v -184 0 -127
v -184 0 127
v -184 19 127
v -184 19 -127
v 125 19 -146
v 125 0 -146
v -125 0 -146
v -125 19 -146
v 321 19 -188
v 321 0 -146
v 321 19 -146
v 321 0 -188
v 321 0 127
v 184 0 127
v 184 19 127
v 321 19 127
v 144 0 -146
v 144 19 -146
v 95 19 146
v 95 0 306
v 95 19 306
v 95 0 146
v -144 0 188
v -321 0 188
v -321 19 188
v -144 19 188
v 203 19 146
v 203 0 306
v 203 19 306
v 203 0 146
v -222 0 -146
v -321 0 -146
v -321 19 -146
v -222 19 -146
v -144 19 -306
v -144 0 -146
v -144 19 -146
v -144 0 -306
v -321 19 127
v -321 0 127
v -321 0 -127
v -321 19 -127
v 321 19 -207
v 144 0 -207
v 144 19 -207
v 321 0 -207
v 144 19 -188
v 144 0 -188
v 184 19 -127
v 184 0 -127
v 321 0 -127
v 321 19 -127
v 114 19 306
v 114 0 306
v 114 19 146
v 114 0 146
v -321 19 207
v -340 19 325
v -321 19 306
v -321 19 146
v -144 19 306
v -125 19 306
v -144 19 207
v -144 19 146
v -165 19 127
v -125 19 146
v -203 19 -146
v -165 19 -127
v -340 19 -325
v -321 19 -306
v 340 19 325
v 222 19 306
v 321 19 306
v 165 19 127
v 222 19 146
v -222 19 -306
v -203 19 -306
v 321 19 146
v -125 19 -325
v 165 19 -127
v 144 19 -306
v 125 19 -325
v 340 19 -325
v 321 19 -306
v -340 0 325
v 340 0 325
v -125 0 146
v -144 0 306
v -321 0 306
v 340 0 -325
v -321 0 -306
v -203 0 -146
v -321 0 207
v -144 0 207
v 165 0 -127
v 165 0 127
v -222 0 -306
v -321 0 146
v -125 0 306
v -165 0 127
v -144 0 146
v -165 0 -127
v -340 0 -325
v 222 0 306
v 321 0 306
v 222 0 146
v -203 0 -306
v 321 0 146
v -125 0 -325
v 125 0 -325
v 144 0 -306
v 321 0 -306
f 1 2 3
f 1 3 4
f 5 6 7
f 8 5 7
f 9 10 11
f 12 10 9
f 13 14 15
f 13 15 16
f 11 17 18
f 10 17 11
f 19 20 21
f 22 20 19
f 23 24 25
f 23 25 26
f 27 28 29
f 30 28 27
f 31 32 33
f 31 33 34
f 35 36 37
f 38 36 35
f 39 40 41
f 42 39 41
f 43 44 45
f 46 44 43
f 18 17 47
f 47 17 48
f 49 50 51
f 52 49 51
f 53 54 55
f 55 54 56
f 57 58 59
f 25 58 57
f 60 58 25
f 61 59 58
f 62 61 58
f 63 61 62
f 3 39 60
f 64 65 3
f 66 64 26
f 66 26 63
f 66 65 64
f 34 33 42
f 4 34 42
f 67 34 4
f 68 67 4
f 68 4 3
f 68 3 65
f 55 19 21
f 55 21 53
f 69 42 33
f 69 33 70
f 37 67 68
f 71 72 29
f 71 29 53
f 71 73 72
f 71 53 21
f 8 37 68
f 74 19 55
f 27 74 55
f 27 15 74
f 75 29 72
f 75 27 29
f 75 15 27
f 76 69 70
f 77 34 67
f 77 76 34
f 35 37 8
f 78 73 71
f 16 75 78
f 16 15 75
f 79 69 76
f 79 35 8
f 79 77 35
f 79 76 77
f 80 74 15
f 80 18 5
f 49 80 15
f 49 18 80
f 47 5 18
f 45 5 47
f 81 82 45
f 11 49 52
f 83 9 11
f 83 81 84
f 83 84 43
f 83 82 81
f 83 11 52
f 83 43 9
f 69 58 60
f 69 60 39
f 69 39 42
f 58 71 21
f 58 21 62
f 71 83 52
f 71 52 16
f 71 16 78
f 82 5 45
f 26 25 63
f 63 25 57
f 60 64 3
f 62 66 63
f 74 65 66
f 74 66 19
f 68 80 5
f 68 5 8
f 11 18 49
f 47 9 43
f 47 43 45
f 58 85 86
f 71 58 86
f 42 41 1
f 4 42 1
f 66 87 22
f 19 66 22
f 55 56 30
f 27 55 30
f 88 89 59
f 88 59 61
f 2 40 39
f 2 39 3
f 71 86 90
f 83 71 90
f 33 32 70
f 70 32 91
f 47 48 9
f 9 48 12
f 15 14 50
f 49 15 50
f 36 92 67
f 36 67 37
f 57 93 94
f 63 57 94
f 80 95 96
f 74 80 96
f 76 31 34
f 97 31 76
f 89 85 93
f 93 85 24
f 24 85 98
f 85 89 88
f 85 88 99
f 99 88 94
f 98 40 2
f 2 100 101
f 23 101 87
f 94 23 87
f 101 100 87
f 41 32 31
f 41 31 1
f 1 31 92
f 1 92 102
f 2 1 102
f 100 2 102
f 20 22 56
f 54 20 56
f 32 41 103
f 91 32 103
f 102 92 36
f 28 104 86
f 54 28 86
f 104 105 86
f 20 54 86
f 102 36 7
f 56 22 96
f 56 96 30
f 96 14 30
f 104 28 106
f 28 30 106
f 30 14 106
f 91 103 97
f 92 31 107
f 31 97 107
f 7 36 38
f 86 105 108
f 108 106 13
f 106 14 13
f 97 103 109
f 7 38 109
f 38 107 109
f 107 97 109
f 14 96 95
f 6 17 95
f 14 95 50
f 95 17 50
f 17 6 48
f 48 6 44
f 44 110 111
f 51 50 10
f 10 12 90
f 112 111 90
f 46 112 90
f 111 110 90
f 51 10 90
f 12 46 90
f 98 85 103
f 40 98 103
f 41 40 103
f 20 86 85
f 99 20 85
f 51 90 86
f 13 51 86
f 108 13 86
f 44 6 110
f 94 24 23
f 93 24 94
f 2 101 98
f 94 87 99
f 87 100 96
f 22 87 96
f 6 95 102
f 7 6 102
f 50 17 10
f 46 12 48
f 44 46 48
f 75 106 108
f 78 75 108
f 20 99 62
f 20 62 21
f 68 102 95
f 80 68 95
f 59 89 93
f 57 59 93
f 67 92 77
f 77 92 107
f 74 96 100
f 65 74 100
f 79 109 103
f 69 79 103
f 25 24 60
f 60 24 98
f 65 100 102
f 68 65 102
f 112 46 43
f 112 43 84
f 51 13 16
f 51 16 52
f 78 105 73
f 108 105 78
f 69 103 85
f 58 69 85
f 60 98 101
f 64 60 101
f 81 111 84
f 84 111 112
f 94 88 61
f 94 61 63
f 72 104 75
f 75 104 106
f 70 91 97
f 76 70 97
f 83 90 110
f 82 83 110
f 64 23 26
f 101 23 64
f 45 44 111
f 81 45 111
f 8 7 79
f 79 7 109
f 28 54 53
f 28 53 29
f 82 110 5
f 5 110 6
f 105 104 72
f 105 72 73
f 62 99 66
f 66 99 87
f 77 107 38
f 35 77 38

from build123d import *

# Parameters (mm, degrees)
SKETCH1_W           = 177
SKETCH1_H           = 99
SKETCH1_H_2         = 42
SKETCH1_W_2         = 220
SKETCH1_H_3         = 160
SKETCH1_W_3         = 89
SKETCH1_W_4         = 99
SKETCH1_W_5         = 137
SKETCH1_H_4         = 254
SKETCH1_W_6         = 59
BOSS_EXTRUDE1_DEPTH = 19


with BuildPart() as part:
    # Sketch1 → Boss-Extrude1 (new body)
    with BuildSketch(Plane(origin=(0, 0, 0), x_dir=(1, 0, 0), z_dir=(0, 1, 0))):
        Polygon((-340, 325), (-340, -325), (340, -325), (340, 325), (125, 325), (125, 146), (-125, 146), (-125, 325), align=None)
        with Locations((-232.5, -256.5)):
            Rectangle(SKETCH1_W, SKETCH1_H, mode=Mode.SUBTRACT)
        with Locations((-232.5, -167)):
            Rectangle(SKETCH1_W, SKETCH1_H_2, mode=Mode.SUBTRACT)
        with Locations((-15, -226)):
            Rectangle(SKETCH1_W_2, SKETCH1_H_3, mode=Mode.SUBTRACT)
        with Locations((158.5, -226)):
            Rectangle(SKETCH1_W_3, SKETCH1_H_3, mode=Mode.SUBTRACT)
        with Locations((271.5, -226)):
            Rectangle(SKETCH1_W_4, SKETCH1_H_3, mode=Mode.SUBTRACT)
        with Locations((-252.5, 0)):
            Rectangle(SKETCH1_W_5, SKETCH1_H_4, mode=Mode.SUBTRACT)
        with Locations((-271.5, 226)):
            Rectangle(SKETCH1_W_4, SKETCH1_H_3, mode=Mode.SUBTRACT)
        with Locations((-173.5, 226)):
            Rectangle(SKETCH1_W_6, SKETCH1_H_3, mode=Mode.SUBTRACT)
        Polygon((-165, -127), (-165, 127), (132.861538462, 127), (165, 127), (165, -127), (114, -127), (95, -127), (-125, -127), (-144, -127), align=None, mode=Mode.SUBTRACT)
        with Locations((252.5, 0)):
            Rectangle(SKETCH1_W_5, SKETCH1_H_4, mode=Mode.SUBTRACT)
        with Locations((232.5, 167)):
            Rectangle(SKETCH1_W, SKETCH1_H_2, mode=Mode.SUBTRACT)
        with Locations((232.5, 256.5)):
            Rectangle(SKETCH1_W, SKETCH1_H, mode=Mode.SUBTRACT)
    extrude(amount=BOSS_EXTRUDE1_DEPTH)


solid = part.part
